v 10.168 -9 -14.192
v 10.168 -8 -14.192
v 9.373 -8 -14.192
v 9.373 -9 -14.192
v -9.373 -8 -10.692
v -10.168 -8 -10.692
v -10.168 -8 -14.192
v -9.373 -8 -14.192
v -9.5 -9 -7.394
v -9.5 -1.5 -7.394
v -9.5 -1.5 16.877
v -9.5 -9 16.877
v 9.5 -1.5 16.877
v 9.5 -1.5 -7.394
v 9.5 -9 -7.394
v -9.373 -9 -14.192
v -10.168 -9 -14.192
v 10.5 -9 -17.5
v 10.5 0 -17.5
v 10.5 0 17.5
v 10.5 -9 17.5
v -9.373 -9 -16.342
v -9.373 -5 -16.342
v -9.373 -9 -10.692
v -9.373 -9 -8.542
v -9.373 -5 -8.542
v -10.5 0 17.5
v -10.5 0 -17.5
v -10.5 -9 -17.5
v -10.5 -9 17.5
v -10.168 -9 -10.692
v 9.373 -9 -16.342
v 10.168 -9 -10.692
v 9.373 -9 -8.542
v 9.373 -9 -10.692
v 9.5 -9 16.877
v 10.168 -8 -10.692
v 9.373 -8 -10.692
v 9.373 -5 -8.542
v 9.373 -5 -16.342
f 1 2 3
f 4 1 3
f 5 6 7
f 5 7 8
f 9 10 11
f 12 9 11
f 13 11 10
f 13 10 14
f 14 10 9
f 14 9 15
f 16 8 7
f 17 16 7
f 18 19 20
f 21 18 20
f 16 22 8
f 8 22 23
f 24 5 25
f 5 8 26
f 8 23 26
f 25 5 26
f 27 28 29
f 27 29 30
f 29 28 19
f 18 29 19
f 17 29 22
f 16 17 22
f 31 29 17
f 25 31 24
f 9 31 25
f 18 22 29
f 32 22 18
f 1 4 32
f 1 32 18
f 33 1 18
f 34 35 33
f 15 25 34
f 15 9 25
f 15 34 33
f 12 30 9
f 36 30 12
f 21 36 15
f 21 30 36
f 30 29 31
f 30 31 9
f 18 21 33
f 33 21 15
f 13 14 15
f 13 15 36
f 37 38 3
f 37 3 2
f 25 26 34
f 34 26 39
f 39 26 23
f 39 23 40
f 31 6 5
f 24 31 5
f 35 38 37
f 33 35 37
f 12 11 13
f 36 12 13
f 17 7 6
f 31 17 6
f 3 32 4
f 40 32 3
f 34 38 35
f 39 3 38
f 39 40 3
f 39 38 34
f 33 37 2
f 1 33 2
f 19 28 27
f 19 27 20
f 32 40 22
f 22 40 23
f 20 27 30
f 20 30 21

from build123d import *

# Parameters (mm, degrees)
F0_W     = 21
F0_H     = 35
F0_W_2   = 19
F0_H_2   = 24.2712582345
F1_DEPTH = 9
F2_DEPTH = 1.5
F3_DEPTH = 5
F0_W_3   = 0.7944880121
F0_H_3   = 3.5
F4_DEPTH = 8


# Not quite as in the source:
# - a feature names something its author has since deleted; it is built from what else it names


with BuildPart() as f1:
    # F0 (on Front) → F1 (new body)
    with BuildSketch(Plane.XZ):
        Rectangle(F0_W, F0_H)
        Polygon((-9.3731830162, -10.6923110513), (-9.3731830162, -8.5423110513), (9.3731830162, -8.5423110513), (9.3731830162, -10.6923110513), (10.1676710284, -10.6923110513), (10.1676710284, -14.1923110513), (9.3731830162, -14.1923110513), (9.3731830162, -16.3423110513), (-9.3731830162, -16.3423110513), (-9.3731830162, -14.1923110513), (-10.1676710284, -14.1923110513), (-10.1676710284, -10.6923110513), align=None, mode=Mode.SUBTRACT)
        with Locations((0, 4.7412435117)):
            Rectangle(F0_W_2, F0_H_2, mode=Mode.SUBTRACT)
    extrude(amount=F1_DEPTH)

    # F0 (on Front) → F2 (join)
    with BuildSketch(Plane.XZ):
        with Locations((0, 4.7412435117)):
            Rectangle(F0_W_2, F0_H_2)
    extrude(amount=F2_DEPTH)

    # F0 (on Front) → F3 (join)
    with BuildSketch(Plane.XZ):
        Polygon((9.3731830162, -8.5423110513), (-9.3731830162, -8.5423110513), (-9.3731830162, -10.6923110513), (-9.3731830162, -14.1923110513), (-9.3731830162, -16.3423110513), (9.3731830162, -16.3423110513), (9.3731830162, -14.1923110513), (9.3731830162, -10.6923110513), align=None)
    extrude(amount=F3_DEPTH)

    # F0 (on Front) → F4 (join)
    with BuildSketch(Plane.XZ):
        with Locations((9.7704270223, -12.4423110513)):
            Rectangle(F0_W_3, F0_H_3)
        with Locations((-9.7704270223, -12.4423110513)):
            Rectangle(F0_W_3, F0_H_3)
    extrude(amount=F4_DEPTH)


solid = f1.part
